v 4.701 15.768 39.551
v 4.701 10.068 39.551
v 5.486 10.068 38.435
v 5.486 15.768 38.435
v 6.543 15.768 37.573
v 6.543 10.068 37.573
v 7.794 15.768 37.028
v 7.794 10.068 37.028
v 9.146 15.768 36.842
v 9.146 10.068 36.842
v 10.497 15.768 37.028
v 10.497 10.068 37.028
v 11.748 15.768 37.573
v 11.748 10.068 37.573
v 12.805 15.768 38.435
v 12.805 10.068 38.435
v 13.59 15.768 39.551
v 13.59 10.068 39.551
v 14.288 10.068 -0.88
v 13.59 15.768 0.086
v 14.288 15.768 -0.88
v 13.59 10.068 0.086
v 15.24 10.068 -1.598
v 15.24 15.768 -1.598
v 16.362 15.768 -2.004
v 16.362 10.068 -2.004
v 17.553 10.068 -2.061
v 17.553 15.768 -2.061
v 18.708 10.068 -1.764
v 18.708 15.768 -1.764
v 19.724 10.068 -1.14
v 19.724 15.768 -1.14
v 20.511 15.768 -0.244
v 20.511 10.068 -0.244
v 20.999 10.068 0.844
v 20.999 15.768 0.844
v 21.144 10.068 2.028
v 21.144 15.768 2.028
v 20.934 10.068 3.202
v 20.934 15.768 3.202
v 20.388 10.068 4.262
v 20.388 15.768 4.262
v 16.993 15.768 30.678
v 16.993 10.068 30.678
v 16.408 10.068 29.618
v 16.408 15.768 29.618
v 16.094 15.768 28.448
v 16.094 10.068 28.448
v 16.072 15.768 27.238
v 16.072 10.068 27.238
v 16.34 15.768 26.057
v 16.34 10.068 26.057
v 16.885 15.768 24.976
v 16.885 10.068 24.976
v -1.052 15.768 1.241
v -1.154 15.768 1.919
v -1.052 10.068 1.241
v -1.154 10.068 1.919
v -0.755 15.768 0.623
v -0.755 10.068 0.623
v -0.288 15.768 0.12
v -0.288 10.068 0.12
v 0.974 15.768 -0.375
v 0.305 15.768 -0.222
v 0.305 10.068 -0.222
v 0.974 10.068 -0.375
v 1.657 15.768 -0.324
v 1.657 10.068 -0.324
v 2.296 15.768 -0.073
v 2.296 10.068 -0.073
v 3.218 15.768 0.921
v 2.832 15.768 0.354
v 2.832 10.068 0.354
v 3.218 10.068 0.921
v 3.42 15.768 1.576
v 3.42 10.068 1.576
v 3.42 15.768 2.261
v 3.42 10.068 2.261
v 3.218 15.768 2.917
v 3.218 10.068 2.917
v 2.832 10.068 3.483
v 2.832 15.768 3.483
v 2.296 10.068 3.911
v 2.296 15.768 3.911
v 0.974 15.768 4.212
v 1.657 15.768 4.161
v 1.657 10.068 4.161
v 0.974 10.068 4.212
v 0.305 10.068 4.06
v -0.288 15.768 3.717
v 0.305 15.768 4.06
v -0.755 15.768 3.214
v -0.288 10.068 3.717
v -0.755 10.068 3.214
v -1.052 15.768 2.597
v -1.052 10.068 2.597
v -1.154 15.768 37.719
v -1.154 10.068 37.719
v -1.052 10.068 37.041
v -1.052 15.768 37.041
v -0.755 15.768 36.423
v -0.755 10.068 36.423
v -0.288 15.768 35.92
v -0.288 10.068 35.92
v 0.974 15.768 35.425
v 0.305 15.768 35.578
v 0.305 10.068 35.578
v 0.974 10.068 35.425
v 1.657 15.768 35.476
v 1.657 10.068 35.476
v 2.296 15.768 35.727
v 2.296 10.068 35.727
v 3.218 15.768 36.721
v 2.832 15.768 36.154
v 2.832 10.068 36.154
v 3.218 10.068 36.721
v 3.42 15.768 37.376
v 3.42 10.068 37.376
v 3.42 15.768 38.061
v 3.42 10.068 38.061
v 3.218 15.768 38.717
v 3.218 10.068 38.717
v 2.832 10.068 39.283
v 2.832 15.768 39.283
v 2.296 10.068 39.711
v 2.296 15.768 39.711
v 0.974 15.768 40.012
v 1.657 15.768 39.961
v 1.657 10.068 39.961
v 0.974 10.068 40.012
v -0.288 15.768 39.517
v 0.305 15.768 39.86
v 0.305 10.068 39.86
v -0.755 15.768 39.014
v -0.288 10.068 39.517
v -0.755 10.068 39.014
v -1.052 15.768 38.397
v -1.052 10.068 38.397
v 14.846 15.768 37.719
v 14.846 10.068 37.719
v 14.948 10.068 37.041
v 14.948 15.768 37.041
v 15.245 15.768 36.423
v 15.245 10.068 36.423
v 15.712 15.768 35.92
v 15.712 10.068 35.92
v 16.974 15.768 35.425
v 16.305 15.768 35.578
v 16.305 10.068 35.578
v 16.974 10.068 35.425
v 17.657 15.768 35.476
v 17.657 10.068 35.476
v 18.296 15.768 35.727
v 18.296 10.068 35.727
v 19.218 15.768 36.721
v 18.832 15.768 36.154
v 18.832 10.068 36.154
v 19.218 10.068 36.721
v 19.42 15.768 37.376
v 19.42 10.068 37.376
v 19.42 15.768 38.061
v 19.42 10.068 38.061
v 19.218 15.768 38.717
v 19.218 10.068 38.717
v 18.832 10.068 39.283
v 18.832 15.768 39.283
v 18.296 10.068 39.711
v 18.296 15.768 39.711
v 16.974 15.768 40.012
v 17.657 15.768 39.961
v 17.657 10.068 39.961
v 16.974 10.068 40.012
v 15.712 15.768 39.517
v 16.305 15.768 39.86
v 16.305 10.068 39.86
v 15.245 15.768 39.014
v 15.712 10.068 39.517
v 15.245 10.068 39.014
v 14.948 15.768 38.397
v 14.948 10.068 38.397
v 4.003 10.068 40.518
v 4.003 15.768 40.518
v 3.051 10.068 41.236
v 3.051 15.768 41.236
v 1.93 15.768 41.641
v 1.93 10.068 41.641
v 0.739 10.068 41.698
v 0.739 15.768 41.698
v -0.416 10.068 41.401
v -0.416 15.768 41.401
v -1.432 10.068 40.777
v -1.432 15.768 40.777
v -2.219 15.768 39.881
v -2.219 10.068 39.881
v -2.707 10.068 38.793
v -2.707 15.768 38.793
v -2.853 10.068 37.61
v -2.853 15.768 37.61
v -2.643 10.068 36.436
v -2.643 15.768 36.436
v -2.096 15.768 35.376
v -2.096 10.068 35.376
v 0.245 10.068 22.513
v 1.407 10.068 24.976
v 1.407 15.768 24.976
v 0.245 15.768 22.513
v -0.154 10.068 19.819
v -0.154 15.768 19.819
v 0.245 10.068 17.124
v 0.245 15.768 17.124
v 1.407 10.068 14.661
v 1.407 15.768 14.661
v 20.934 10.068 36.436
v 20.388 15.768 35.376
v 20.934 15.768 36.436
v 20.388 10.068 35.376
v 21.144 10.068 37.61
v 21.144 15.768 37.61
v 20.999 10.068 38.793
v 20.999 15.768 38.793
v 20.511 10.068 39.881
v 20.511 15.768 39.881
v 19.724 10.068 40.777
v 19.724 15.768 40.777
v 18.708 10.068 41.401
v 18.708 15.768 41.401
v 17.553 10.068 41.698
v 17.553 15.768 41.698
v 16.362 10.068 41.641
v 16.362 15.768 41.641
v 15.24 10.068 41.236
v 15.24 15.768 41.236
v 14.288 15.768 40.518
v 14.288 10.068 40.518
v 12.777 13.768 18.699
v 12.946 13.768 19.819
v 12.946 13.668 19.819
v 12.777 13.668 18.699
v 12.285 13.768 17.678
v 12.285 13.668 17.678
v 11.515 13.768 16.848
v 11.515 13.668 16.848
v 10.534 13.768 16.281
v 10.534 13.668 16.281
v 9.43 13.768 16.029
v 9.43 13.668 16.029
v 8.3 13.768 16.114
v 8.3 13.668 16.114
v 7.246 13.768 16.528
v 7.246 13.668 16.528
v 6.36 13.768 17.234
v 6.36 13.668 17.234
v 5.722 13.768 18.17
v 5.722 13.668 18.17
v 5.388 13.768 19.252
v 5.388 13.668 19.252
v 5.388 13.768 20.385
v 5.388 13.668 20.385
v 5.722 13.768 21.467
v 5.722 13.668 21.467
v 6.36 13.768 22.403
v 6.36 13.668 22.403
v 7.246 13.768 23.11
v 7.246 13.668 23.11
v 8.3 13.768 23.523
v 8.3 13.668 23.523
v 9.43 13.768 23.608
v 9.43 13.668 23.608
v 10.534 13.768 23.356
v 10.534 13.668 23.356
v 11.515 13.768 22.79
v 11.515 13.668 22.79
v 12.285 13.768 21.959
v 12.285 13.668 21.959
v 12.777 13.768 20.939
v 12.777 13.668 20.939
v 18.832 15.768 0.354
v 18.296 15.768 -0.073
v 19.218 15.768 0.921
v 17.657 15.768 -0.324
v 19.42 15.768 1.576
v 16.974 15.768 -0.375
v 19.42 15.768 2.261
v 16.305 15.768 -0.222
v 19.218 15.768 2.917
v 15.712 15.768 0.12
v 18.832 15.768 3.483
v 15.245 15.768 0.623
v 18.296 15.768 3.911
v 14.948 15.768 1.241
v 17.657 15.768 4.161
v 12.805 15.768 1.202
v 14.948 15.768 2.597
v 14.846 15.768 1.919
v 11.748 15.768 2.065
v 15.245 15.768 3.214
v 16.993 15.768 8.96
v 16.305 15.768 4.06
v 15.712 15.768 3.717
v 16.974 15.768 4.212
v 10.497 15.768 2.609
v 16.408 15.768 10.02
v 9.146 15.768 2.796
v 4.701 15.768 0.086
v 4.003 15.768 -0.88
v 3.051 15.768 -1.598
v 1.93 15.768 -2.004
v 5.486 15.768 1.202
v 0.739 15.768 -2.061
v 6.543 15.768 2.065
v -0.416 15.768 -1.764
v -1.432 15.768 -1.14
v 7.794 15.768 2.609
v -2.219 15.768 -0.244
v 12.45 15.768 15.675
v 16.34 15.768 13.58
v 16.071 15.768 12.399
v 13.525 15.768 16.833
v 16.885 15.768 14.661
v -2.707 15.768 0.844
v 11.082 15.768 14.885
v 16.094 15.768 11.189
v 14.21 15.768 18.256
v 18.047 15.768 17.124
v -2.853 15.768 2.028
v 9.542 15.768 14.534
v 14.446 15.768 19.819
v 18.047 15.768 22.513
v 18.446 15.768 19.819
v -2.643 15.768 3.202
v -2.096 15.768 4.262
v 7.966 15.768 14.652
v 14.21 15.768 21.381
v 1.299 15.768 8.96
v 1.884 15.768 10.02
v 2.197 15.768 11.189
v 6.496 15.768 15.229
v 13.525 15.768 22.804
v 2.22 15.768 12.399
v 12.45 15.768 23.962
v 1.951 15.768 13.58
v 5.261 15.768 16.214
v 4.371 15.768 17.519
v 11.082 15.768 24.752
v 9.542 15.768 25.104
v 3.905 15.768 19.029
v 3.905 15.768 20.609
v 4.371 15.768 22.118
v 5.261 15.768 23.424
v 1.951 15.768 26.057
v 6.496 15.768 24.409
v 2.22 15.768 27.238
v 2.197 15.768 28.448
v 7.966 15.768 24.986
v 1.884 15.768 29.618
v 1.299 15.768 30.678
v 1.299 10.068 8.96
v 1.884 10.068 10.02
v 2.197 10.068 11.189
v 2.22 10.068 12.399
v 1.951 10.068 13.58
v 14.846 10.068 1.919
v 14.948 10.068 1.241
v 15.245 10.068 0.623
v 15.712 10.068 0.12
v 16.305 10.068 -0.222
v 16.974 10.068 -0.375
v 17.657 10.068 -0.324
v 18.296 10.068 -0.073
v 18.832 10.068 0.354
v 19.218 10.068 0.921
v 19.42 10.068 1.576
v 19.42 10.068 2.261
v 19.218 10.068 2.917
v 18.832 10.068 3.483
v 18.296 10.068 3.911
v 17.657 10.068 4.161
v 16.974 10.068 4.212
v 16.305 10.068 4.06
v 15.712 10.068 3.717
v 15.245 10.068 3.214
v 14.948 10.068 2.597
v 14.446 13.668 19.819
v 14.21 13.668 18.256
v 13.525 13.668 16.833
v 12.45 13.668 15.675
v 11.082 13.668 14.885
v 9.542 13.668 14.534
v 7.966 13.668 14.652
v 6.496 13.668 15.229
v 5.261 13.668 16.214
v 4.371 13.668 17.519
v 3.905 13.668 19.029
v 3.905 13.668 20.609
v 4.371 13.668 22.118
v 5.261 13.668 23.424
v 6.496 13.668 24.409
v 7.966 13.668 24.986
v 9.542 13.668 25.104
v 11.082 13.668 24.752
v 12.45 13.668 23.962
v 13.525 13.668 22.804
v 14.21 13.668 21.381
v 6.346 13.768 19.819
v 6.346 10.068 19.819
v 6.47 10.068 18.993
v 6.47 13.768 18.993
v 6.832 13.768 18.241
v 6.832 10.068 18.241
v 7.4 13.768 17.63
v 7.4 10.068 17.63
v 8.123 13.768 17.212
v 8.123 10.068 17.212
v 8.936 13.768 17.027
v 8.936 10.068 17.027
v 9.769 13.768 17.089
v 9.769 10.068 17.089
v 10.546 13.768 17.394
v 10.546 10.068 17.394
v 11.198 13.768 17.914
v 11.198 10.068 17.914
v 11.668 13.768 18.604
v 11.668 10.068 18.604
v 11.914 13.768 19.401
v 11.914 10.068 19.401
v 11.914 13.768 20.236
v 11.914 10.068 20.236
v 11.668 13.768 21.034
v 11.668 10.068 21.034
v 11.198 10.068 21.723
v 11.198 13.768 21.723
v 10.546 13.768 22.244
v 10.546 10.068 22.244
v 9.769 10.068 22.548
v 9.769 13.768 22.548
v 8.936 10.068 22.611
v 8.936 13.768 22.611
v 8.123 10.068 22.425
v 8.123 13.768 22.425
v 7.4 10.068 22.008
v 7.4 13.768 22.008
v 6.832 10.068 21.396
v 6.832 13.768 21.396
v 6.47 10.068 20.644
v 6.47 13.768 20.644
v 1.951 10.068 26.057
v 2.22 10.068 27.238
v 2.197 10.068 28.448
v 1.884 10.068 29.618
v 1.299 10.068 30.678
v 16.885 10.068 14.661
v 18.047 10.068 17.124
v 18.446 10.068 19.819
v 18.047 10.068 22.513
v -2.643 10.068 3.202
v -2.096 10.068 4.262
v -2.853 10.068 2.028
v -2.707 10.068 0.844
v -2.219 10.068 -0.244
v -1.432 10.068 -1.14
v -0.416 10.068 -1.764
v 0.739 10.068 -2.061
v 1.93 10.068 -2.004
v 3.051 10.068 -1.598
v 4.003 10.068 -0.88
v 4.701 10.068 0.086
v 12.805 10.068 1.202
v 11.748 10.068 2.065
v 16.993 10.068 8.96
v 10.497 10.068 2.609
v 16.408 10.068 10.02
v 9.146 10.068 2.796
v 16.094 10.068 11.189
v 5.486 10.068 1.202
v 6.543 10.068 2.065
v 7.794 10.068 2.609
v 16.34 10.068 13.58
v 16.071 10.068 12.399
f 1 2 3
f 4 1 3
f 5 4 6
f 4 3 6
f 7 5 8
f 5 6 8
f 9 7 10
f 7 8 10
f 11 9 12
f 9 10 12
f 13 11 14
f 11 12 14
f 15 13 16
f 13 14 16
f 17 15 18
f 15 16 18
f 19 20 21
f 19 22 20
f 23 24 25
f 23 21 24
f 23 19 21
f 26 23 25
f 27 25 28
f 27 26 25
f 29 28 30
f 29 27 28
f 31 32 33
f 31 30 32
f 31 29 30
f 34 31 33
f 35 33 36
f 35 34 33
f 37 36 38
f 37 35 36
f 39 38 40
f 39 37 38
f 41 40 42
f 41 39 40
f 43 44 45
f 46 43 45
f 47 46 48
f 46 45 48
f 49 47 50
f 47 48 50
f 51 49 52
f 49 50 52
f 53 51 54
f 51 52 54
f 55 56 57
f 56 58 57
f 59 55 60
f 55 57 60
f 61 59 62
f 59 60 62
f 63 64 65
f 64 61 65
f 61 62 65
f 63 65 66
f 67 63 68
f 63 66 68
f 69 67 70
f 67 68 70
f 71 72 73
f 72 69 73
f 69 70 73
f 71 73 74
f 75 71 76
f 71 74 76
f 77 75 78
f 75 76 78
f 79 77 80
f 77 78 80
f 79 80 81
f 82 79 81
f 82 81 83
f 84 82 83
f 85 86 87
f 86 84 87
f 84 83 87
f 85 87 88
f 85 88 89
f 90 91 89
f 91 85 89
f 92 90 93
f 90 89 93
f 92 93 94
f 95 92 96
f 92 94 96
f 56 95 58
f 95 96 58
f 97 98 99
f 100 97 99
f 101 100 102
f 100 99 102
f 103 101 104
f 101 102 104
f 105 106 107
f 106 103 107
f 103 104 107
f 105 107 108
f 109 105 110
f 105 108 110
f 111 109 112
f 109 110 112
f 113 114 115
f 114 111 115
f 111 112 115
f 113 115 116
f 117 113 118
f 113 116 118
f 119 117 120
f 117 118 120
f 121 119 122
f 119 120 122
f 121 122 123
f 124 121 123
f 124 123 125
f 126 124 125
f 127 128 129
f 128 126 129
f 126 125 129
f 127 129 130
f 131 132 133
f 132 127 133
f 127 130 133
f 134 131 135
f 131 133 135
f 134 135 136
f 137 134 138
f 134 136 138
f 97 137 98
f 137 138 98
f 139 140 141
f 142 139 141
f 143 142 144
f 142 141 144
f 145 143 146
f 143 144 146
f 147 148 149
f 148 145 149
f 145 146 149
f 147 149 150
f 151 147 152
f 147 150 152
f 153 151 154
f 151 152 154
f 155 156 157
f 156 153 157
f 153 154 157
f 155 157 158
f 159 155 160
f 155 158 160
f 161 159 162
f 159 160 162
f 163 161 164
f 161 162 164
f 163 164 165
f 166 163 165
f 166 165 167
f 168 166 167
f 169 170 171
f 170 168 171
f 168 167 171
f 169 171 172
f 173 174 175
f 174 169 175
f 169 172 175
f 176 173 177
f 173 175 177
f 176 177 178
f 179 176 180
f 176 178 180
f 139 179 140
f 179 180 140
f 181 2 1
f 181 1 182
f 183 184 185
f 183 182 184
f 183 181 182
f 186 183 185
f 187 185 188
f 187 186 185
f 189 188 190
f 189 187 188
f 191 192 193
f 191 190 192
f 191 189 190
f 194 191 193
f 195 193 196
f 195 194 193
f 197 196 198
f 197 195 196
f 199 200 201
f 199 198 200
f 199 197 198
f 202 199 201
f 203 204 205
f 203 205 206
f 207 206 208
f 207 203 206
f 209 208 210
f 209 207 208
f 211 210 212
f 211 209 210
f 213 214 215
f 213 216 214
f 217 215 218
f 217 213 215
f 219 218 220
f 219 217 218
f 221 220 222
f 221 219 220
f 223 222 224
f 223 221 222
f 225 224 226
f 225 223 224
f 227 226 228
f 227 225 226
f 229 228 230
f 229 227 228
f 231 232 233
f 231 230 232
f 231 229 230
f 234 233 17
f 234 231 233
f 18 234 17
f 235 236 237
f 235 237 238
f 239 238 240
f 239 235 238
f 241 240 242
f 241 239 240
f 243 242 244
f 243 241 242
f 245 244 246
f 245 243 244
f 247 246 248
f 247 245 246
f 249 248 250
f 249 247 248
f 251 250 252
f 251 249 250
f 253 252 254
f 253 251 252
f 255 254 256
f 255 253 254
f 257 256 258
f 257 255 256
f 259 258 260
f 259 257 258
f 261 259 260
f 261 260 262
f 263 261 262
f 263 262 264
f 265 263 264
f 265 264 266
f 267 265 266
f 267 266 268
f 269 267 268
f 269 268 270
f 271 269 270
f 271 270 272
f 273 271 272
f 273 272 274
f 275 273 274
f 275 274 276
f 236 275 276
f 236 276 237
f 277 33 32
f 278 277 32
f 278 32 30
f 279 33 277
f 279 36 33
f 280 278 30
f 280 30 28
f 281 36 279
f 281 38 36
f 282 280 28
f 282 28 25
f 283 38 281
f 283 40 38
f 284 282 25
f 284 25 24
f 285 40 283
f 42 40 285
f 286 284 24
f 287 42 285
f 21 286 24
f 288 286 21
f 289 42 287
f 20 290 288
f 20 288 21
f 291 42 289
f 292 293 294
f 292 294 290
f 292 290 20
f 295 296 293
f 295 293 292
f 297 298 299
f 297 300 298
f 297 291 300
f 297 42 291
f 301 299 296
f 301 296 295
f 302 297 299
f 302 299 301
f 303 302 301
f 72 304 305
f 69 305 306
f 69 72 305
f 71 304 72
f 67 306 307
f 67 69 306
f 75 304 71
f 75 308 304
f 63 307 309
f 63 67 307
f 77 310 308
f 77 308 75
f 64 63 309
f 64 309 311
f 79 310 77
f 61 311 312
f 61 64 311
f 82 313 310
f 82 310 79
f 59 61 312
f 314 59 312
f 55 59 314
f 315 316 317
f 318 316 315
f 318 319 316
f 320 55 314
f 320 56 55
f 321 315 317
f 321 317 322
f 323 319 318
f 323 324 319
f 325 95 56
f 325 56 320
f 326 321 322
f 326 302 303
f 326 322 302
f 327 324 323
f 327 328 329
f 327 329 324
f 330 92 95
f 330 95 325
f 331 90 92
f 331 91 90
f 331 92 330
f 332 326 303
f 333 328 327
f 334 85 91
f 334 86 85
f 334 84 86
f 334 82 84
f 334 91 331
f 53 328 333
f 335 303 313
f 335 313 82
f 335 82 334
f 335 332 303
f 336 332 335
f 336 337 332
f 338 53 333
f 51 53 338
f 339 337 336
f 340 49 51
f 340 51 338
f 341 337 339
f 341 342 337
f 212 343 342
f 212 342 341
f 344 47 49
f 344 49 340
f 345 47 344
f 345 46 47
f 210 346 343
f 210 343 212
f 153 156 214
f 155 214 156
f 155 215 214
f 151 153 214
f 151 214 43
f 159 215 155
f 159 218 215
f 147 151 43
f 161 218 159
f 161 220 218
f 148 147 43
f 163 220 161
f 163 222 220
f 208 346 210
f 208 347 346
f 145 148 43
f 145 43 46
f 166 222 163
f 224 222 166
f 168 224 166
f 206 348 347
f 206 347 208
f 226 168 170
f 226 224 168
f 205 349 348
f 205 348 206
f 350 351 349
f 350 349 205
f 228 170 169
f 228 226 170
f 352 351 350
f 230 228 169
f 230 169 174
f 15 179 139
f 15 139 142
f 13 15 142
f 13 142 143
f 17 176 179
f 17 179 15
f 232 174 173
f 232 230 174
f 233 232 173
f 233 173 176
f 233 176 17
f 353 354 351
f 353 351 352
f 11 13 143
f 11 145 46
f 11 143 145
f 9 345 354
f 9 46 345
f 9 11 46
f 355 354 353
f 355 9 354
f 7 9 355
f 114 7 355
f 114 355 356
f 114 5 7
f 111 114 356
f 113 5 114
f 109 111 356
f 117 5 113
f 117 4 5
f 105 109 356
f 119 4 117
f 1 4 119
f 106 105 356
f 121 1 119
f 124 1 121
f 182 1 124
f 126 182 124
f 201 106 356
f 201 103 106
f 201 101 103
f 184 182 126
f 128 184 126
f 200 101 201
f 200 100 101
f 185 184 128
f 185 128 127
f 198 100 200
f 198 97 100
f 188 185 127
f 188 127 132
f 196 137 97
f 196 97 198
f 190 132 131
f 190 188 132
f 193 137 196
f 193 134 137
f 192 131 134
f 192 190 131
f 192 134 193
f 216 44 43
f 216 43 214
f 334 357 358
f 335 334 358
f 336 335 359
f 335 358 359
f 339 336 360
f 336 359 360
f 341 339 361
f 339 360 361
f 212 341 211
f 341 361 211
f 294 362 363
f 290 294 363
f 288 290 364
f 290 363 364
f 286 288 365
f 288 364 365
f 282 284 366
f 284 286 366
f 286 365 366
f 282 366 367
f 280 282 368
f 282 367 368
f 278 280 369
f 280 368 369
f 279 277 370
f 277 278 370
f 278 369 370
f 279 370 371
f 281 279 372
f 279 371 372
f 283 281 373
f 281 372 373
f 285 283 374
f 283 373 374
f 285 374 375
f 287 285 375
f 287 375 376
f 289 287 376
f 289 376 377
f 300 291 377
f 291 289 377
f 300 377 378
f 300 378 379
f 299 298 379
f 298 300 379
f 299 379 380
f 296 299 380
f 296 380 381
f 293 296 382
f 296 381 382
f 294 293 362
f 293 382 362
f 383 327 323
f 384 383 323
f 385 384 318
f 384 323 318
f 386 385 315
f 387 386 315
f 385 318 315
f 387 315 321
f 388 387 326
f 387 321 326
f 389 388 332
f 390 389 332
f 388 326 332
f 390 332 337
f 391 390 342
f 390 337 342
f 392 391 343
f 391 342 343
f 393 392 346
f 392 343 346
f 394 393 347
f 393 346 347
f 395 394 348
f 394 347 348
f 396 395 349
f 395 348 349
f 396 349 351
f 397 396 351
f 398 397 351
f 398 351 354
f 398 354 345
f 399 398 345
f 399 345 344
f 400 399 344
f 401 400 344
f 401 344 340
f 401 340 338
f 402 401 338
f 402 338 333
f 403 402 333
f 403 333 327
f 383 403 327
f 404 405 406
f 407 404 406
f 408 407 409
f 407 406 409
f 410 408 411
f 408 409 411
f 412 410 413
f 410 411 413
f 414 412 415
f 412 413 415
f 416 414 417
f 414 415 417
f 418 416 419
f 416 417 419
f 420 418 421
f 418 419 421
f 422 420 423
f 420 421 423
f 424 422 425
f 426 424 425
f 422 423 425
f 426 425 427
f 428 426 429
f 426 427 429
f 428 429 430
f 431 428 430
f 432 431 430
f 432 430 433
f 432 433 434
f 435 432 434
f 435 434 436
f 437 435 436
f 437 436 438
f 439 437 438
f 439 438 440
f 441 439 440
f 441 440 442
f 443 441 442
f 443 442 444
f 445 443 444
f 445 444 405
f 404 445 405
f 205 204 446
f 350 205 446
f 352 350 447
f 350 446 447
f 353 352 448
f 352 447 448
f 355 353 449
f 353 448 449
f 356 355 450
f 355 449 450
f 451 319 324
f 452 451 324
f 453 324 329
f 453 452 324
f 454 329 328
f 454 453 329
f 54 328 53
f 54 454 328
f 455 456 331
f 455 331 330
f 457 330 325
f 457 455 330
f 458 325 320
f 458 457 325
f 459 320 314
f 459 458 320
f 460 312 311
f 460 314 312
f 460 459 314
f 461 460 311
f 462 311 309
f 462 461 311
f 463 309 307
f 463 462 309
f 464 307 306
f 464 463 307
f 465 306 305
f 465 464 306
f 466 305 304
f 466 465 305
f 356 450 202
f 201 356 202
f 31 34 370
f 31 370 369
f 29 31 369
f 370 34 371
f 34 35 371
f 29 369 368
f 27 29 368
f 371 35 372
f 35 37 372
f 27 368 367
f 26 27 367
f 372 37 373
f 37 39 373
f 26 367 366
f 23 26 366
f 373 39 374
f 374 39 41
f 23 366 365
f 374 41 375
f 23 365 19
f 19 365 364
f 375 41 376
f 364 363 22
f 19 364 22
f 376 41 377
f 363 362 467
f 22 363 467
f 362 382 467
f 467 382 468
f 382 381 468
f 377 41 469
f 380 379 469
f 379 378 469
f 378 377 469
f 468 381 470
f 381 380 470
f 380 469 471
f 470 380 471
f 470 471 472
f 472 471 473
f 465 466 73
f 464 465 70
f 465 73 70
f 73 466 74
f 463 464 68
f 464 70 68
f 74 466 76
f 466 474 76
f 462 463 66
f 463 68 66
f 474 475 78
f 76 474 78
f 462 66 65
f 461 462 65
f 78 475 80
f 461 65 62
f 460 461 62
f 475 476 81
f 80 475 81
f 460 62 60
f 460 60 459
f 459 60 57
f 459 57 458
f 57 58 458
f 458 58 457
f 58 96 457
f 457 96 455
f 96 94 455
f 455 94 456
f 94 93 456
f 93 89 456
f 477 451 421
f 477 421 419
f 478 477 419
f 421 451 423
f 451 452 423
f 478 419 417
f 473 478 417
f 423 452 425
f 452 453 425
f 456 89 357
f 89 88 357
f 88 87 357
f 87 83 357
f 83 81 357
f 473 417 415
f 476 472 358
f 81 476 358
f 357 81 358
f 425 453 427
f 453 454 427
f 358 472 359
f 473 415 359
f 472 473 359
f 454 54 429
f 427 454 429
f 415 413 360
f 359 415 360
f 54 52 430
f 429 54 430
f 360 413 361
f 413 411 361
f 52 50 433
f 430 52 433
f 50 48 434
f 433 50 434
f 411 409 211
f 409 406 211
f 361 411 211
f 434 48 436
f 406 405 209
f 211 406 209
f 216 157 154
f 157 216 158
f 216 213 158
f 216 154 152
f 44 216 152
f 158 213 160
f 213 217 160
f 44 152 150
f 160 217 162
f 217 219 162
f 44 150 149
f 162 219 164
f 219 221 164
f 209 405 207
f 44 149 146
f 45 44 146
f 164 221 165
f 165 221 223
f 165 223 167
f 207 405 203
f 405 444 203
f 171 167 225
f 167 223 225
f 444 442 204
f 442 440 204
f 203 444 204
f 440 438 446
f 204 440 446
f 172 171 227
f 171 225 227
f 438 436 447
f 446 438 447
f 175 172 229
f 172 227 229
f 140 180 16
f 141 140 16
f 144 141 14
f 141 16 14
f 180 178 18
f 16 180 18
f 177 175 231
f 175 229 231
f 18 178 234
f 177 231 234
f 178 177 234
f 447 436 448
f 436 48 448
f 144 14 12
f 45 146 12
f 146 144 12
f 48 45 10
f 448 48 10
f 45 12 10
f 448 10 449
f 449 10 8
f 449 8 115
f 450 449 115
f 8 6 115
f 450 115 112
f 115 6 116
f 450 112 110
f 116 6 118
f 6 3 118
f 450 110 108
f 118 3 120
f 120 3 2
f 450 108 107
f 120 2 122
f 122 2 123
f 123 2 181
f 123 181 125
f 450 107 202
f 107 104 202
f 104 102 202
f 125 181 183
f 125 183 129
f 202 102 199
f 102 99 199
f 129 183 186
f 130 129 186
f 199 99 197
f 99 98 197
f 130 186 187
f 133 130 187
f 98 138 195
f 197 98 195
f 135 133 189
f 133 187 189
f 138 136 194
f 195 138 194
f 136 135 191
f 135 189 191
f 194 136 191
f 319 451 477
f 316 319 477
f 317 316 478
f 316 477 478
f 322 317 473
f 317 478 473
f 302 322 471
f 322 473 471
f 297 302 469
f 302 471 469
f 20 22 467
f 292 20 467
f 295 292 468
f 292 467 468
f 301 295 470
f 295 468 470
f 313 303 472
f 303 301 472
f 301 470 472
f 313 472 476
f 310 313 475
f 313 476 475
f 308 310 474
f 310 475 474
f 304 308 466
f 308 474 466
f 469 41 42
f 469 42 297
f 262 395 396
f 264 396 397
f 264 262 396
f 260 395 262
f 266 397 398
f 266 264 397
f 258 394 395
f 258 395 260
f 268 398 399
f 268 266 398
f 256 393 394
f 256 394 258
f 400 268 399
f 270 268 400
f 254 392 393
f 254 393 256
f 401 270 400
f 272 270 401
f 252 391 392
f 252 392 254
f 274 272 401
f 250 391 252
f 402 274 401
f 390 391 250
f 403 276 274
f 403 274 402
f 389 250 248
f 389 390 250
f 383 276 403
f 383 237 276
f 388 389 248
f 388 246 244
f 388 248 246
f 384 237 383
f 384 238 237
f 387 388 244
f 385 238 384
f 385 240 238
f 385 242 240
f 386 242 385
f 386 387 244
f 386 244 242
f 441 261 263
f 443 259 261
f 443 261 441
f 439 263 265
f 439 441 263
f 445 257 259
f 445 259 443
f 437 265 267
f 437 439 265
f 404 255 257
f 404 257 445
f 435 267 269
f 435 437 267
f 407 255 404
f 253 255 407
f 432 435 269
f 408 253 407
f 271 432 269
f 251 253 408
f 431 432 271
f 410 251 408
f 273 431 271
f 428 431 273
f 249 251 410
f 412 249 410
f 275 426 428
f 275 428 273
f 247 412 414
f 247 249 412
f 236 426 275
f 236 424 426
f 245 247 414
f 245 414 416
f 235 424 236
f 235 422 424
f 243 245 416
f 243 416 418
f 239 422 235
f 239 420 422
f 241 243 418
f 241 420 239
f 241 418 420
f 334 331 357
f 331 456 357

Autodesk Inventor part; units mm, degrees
ref_plane "YZ Plane" through (0, 0, 0) normal (1, 0, 0) x (0, 1, 0)
ref_plane "Work Plane1" through (9.1457, 10.0679, 19.8187) normal (0, 1, 0) x (-1, 0, 0)
sketch "Sketch1" plane through (9.1457, 10.0679, 19.8187) normal (0, 1, 0) x (-1, 0, 0)
  circle A0 centre (-8, -17.9) radius 2 construction
  circle A1 centre (-8, 17.9) radius 2 construction
  arc A2 (7.7389, -5.1575) -> (7.7389, 5.1575) centre (0, 0) ccw projected
  arc A3 (-4.4444, 19.7325) -> (-11.2421, 15.5572) centre (-8, 17.9) ccw projected
  line L0 (-7.847, 10.8589) -> (-11.2421, 15.5572) projected
  arc A4 (-7.7389, 5.1575) -> (-7.847, 10.8589) centre (-11.8996, 7.9303) ccw projected
  arc A5 (-7.847, -10.8589) -> (-7.7389, -5.1575) centre (-11.8996, -7.9303) ccw projected
  line L1 (-11.2421, -15.5572) -> (-7.847, -10.8589) projected
  arc A6 (-11.2421, -15.5572) -> (-4.4444, -19.7325) centre (-8, -17.9) ccw projected
  circle A7 centre (0, 0) radius 7.3 construction
  circle A8 centre (0, 0) radius 5 construction
  circle A9 centre (0, 0) radius 2.5 construction
  circle A10 centre (-8, 17.9) radius 2.3
  circle A11 centre (-8, -17.9) radius 2.3
  circle A12 centre (8, -17.9) radius 2 construction
  circle A13 centre (8, 17.9) radius 2 construction
  arc A14 (4.4444, -19.7325) -> (-4.4444, -19.7325) centre (0, -22.0231) ccw projected
  arc A15 (4.4444, -19.7325) -> (11.2421, -15.5572) centre (8, -17.9) ccw projected
  line L2 (11.2421, -15.5572) -> (7.847, -10.8589) projected
  arc A16 (7.7389, -5.1575) -> (7.847, -10.8589) centre (11.8996, -7.9303) ccw projected
  arc A17 (7.847, 10.8589) -> (7.7389, 5.1575) centre (11.8996, 7.9303) ccw projected
  line L3 (7.847, 10.8589) -> (11.2421, 15.5572) projected
  arc A18 (11.2421, 15.5572) -> (4.4444, 19.7325) centre (8, 17.9) ccw projected
  arc A19 (-4.4444, 19.7325) -> (4.4444, 19.7325) centre (0, 22.0231) ccw projected
  circle A20 centre (8, -17.9) radius 2.3
  circle A21 centre (8, 17.9) radius 2.3
  arc A22 (1.8, 2.1448) -> (-1.8, 2.1448) centre (0, 0) ccw construction
  line L4 (-1.8, -2.1448) -> (-1.8, 2.1448) construction
  arc A23 (-1.8, -2.1448) -> (1.8, -2.1448) centre (0, 0) ccw construction
  line L5 (1.8, 2.1448) -> (1.8, -2.1448) construction
  line L6 (1.5, 2) -> (1.5, -2) projected
  arc A24 (-1.5, -2) -> (1.5, -2) centre (0, 0) ccw projected
  line L7 (-1.5, -2) -> (-1.5, 2) projected
  arc A25 (1.5, 2) -> (-1.5, 2) centre (0, 0) ccw projected
  circle A26 centre (0, 0) radius 2.8
  arc A27 (-7.7389, 5.1575) -> (-7.7389, -5.1575) centre (0, 0) ccw projected
  point P0 (9.1457, -19.8187)
  point P1 (-13.1394, 9.646)
  point P2 (-13.1394, -9.646)
  point P3 (13.1394, -9.646)
  point P4 (13.1394, 9.646)
  point P5 (-11.8996, 7.9303)
  point P6 (-11.8996, -7.9303)
  point P7 (11.8996, -7.9303)
  point P8 (11.8996, 7.9303)
  point P9 (11.8996, -7.9303)
  point P10 (11.8996, 7.9303)
  point P11 (-11.8996, 7.9303)
  point P12 (-11.8996, -7.9303)
  point P13 (11.8996, -7.9303)
  point P14 (11.8996, 7.9303)
  point P15 (0, 0)
  point P16 (11.8996, -7.9303)
  point P17 (11.8996, 7.9303)
  point P18 (11.8996, -7.9303)
  point P19 (11.8996, 7.9303)
  point P20 (-11.8996, 7.9303)
  point P21 (-11.8996, -7.9303)
  dimension "d1" = 0.3
  dimension "d2" = 0.3
  dimension "d8" = 0.3
  dimension "d9" = 0.3
  dimension "d20" = 0.3
ref_plane "Work Plane2" through (17.1457, 15.7679, 19.8187) normal (0, -1, 0) x (-1, 0, 0)
extrude "Extrusion1" add sketch "Sketch1" along normal up to surface (5.7 mm away) contours A16 L2 A15 A14 A6 L1 A5 A27 A4 L0 A3 A19 A18 L3 A17 A2
sketch "Sketch3" plane through (9.1457, 15.7679, 41.8418) normal (0, 1, 0) x (1, 0, 0)
  circle A0 centre (0, 22.0231) radius 5 construction
  circle A1 centre (0, 22.0231) radius 5.3
  point P0 (-9.1457, 41.8418)
  dimension "d11" = 0.3
ref_plane "Work Plane4" through (9.1457, 13.7679, 19.8187) normal (0, -1, 0) x (-1, 0, 0)
extrude "Extrusion3" cut sketch "Sketch3" against normal up to surface (2 mm away)
sketch "Sketch4" plane through (9.1457, 13.7679, 19.8187) normal (0, 1, 0) x (1, 0, 0)
  circle A0 centre (0, 0) radius 3.8 projected
  circle A1 centre (0, 0) radius 5.3 projected
  point P0 (-9.1457, 19.8187)
extrude "Extrusion4" cut sketch "Sketch4" against normal blind 0.1
ref_plane "Work Plane5" through (1.2414, 11.6271, 11.9106) normal (0, 1, 0) x (0, 0, 1)
properties part number "shaft encap lid"
